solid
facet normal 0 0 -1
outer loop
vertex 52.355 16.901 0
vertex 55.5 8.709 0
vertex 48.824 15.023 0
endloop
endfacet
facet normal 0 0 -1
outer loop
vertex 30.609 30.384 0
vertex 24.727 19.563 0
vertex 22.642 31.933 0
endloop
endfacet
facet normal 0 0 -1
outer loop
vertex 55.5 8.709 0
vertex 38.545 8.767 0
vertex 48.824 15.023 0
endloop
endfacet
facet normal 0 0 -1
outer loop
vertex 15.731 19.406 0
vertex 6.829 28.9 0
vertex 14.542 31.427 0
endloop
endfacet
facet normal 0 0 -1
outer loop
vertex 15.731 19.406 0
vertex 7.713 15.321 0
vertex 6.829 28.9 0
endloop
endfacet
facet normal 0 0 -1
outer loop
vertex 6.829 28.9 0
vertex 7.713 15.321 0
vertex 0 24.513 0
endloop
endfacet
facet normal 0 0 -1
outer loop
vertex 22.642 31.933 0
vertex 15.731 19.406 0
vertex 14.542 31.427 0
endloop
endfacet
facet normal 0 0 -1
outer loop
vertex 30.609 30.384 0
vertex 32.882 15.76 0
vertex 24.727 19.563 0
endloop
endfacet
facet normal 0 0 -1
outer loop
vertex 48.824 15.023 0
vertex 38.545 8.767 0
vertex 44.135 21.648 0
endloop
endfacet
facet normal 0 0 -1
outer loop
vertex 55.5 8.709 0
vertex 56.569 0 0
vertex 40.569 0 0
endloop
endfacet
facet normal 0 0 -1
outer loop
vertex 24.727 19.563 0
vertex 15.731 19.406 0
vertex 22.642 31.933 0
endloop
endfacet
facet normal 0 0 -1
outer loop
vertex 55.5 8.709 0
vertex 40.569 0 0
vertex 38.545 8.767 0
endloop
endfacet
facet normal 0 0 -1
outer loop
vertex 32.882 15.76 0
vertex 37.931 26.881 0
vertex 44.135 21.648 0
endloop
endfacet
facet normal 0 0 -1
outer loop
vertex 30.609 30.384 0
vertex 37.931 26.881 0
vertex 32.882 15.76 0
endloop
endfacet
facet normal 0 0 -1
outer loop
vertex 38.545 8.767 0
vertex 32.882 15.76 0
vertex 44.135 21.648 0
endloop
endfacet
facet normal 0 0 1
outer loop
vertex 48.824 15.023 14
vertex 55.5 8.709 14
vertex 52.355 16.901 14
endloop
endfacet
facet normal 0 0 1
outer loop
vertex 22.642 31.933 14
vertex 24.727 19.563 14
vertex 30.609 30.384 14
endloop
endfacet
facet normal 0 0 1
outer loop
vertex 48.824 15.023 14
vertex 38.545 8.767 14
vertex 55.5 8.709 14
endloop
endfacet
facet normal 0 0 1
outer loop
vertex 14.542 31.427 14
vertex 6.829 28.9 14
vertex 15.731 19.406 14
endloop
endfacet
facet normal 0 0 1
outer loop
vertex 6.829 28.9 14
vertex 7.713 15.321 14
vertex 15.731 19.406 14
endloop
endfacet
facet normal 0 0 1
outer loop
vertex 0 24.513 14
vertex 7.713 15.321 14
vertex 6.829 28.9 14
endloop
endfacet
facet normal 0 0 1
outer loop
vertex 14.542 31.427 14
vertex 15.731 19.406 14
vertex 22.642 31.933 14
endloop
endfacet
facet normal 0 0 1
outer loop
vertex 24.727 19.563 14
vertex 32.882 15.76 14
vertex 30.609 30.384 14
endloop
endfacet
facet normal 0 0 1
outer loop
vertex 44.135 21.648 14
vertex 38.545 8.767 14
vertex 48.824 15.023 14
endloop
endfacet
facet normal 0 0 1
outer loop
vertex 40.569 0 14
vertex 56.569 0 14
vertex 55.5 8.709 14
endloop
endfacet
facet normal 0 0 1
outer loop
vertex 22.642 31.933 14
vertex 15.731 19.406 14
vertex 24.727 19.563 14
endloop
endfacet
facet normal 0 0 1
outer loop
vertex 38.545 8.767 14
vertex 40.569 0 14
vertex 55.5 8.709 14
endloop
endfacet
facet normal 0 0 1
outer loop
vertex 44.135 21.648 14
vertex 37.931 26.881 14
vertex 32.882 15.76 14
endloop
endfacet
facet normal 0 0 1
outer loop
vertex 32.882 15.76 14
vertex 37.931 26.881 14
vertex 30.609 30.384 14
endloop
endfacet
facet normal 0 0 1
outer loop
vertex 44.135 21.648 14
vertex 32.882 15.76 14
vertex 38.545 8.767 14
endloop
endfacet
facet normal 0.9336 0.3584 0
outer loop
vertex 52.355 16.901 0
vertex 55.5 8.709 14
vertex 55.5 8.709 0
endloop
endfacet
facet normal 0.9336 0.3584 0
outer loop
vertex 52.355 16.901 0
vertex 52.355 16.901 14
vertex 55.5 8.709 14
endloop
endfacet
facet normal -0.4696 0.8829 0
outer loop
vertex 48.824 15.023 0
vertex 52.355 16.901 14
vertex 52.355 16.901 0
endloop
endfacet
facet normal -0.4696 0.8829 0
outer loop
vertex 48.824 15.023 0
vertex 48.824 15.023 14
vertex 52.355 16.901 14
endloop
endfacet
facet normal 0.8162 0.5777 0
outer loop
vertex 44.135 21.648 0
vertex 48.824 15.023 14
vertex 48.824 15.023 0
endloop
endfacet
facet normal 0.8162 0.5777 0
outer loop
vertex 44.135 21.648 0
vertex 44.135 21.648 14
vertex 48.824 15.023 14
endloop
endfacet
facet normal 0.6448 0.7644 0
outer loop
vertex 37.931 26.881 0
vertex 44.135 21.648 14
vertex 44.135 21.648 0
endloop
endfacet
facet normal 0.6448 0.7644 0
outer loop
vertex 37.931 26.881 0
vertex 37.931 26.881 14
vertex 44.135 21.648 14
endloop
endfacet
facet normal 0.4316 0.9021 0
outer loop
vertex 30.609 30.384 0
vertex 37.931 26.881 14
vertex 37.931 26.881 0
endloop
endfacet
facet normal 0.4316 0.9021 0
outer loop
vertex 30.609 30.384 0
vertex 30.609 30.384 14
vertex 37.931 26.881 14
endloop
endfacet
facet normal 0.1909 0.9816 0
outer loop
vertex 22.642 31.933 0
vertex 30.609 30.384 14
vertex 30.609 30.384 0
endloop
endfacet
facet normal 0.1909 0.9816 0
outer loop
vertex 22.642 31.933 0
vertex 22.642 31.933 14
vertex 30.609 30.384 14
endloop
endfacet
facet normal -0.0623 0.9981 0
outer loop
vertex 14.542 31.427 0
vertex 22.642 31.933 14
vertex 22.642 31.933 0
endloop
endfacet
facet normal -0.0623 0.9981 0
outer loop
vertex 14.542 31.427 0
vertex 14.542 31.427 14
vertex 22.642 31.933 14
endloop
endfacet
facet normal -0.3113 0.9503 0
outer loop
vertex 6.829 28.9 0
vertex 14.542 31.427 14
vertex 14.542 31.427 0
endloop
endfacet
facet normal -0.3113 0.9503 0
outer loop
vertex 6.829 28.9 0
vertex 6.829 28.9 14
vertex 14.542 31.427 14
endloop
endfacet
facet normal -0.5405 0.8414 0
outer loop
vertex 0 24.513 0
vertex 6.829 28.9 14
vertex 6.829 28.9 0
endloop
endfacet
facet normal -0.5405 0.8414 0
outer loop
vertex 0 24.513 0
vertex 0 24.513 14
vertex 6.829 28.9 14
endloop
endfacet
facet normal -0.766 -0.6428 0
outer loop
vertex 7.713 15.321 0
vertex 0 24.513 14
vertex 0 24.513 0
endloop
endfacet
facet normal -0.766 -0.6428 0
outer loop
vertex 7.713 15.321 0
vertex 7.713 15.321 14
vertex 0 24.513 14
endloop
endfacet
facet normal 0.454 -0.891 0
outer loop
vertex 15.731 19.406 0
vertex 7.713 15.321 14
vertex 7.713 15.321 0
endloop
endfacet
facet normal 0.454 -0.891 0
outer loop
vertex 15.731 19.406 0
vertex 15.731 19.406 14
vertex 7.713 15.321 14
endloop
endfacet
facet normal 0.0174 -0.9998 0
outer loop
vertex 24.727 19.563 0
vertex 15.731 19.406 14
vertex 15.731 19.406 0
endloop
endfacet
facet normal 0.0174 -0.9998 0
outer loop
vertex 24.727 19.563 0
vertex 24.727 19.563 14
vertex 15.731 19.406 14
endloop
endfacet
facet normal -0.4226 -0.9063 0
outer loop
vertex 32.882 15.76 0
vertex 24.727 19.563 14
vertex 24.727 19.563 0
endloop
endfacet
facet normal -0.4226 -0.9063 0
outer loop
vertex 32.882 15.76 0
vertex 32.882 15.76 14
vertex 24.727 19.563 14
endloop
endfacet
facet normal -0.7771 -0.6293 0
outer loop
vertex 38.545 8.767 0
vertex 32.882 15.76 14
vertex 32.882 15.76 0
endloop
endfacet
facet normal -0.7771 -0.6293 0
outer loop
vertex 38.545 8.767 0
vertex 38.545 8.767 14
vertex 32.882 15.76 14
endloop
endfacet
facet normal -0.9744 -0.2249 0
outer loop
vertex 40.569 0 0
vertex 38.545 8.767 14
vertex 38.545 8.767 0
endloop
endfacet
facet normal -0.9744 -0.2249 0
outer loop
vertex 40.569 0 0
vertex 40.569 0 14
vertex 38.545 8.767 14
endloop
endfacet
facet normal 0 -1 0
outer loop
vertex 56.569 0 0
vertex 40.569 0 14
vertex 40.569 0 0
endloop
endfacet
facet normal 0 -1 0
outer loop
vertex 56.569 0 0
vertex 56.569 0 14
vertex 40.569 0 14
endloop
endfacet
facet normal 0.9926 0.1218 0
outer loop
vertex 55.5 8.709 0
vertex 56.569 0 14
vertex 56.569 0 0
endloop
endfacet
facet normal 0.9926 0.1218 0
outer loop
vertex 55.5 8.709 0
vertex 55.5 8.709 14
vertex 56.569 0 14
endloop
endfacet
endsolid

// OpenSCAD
$fn = 32;

// ----------------------------------------------------------------------
// Arc stop: segment, 14 mm thick
// ----------------------------------------------------------------------

// --- parameters (mm) ---
profile_height = 14;      // extrusion height
profile_points = 17;      // points of the closed outline

profile = [[56.569, 0], [55.5, 8.709], [52.355, 16.901], [48.824, 15.023], [44.135, 21.648], [37.931, 26.881], [30.609, 30.384], [22.642, 31.933], [14.542, 31.427], [6.829, 28.9], [0, 24.513], [7.713, 15.321], [15.731, 19.406], [24.727, 19.563], [32.882, 15.76], [38.545, 8.767], [40.569, 0]];  // single closed polygon, 17 points, counter clockwise

// --- the one profile operation ---
linear_extrude(height = profile_height) polygon(points = profile);
